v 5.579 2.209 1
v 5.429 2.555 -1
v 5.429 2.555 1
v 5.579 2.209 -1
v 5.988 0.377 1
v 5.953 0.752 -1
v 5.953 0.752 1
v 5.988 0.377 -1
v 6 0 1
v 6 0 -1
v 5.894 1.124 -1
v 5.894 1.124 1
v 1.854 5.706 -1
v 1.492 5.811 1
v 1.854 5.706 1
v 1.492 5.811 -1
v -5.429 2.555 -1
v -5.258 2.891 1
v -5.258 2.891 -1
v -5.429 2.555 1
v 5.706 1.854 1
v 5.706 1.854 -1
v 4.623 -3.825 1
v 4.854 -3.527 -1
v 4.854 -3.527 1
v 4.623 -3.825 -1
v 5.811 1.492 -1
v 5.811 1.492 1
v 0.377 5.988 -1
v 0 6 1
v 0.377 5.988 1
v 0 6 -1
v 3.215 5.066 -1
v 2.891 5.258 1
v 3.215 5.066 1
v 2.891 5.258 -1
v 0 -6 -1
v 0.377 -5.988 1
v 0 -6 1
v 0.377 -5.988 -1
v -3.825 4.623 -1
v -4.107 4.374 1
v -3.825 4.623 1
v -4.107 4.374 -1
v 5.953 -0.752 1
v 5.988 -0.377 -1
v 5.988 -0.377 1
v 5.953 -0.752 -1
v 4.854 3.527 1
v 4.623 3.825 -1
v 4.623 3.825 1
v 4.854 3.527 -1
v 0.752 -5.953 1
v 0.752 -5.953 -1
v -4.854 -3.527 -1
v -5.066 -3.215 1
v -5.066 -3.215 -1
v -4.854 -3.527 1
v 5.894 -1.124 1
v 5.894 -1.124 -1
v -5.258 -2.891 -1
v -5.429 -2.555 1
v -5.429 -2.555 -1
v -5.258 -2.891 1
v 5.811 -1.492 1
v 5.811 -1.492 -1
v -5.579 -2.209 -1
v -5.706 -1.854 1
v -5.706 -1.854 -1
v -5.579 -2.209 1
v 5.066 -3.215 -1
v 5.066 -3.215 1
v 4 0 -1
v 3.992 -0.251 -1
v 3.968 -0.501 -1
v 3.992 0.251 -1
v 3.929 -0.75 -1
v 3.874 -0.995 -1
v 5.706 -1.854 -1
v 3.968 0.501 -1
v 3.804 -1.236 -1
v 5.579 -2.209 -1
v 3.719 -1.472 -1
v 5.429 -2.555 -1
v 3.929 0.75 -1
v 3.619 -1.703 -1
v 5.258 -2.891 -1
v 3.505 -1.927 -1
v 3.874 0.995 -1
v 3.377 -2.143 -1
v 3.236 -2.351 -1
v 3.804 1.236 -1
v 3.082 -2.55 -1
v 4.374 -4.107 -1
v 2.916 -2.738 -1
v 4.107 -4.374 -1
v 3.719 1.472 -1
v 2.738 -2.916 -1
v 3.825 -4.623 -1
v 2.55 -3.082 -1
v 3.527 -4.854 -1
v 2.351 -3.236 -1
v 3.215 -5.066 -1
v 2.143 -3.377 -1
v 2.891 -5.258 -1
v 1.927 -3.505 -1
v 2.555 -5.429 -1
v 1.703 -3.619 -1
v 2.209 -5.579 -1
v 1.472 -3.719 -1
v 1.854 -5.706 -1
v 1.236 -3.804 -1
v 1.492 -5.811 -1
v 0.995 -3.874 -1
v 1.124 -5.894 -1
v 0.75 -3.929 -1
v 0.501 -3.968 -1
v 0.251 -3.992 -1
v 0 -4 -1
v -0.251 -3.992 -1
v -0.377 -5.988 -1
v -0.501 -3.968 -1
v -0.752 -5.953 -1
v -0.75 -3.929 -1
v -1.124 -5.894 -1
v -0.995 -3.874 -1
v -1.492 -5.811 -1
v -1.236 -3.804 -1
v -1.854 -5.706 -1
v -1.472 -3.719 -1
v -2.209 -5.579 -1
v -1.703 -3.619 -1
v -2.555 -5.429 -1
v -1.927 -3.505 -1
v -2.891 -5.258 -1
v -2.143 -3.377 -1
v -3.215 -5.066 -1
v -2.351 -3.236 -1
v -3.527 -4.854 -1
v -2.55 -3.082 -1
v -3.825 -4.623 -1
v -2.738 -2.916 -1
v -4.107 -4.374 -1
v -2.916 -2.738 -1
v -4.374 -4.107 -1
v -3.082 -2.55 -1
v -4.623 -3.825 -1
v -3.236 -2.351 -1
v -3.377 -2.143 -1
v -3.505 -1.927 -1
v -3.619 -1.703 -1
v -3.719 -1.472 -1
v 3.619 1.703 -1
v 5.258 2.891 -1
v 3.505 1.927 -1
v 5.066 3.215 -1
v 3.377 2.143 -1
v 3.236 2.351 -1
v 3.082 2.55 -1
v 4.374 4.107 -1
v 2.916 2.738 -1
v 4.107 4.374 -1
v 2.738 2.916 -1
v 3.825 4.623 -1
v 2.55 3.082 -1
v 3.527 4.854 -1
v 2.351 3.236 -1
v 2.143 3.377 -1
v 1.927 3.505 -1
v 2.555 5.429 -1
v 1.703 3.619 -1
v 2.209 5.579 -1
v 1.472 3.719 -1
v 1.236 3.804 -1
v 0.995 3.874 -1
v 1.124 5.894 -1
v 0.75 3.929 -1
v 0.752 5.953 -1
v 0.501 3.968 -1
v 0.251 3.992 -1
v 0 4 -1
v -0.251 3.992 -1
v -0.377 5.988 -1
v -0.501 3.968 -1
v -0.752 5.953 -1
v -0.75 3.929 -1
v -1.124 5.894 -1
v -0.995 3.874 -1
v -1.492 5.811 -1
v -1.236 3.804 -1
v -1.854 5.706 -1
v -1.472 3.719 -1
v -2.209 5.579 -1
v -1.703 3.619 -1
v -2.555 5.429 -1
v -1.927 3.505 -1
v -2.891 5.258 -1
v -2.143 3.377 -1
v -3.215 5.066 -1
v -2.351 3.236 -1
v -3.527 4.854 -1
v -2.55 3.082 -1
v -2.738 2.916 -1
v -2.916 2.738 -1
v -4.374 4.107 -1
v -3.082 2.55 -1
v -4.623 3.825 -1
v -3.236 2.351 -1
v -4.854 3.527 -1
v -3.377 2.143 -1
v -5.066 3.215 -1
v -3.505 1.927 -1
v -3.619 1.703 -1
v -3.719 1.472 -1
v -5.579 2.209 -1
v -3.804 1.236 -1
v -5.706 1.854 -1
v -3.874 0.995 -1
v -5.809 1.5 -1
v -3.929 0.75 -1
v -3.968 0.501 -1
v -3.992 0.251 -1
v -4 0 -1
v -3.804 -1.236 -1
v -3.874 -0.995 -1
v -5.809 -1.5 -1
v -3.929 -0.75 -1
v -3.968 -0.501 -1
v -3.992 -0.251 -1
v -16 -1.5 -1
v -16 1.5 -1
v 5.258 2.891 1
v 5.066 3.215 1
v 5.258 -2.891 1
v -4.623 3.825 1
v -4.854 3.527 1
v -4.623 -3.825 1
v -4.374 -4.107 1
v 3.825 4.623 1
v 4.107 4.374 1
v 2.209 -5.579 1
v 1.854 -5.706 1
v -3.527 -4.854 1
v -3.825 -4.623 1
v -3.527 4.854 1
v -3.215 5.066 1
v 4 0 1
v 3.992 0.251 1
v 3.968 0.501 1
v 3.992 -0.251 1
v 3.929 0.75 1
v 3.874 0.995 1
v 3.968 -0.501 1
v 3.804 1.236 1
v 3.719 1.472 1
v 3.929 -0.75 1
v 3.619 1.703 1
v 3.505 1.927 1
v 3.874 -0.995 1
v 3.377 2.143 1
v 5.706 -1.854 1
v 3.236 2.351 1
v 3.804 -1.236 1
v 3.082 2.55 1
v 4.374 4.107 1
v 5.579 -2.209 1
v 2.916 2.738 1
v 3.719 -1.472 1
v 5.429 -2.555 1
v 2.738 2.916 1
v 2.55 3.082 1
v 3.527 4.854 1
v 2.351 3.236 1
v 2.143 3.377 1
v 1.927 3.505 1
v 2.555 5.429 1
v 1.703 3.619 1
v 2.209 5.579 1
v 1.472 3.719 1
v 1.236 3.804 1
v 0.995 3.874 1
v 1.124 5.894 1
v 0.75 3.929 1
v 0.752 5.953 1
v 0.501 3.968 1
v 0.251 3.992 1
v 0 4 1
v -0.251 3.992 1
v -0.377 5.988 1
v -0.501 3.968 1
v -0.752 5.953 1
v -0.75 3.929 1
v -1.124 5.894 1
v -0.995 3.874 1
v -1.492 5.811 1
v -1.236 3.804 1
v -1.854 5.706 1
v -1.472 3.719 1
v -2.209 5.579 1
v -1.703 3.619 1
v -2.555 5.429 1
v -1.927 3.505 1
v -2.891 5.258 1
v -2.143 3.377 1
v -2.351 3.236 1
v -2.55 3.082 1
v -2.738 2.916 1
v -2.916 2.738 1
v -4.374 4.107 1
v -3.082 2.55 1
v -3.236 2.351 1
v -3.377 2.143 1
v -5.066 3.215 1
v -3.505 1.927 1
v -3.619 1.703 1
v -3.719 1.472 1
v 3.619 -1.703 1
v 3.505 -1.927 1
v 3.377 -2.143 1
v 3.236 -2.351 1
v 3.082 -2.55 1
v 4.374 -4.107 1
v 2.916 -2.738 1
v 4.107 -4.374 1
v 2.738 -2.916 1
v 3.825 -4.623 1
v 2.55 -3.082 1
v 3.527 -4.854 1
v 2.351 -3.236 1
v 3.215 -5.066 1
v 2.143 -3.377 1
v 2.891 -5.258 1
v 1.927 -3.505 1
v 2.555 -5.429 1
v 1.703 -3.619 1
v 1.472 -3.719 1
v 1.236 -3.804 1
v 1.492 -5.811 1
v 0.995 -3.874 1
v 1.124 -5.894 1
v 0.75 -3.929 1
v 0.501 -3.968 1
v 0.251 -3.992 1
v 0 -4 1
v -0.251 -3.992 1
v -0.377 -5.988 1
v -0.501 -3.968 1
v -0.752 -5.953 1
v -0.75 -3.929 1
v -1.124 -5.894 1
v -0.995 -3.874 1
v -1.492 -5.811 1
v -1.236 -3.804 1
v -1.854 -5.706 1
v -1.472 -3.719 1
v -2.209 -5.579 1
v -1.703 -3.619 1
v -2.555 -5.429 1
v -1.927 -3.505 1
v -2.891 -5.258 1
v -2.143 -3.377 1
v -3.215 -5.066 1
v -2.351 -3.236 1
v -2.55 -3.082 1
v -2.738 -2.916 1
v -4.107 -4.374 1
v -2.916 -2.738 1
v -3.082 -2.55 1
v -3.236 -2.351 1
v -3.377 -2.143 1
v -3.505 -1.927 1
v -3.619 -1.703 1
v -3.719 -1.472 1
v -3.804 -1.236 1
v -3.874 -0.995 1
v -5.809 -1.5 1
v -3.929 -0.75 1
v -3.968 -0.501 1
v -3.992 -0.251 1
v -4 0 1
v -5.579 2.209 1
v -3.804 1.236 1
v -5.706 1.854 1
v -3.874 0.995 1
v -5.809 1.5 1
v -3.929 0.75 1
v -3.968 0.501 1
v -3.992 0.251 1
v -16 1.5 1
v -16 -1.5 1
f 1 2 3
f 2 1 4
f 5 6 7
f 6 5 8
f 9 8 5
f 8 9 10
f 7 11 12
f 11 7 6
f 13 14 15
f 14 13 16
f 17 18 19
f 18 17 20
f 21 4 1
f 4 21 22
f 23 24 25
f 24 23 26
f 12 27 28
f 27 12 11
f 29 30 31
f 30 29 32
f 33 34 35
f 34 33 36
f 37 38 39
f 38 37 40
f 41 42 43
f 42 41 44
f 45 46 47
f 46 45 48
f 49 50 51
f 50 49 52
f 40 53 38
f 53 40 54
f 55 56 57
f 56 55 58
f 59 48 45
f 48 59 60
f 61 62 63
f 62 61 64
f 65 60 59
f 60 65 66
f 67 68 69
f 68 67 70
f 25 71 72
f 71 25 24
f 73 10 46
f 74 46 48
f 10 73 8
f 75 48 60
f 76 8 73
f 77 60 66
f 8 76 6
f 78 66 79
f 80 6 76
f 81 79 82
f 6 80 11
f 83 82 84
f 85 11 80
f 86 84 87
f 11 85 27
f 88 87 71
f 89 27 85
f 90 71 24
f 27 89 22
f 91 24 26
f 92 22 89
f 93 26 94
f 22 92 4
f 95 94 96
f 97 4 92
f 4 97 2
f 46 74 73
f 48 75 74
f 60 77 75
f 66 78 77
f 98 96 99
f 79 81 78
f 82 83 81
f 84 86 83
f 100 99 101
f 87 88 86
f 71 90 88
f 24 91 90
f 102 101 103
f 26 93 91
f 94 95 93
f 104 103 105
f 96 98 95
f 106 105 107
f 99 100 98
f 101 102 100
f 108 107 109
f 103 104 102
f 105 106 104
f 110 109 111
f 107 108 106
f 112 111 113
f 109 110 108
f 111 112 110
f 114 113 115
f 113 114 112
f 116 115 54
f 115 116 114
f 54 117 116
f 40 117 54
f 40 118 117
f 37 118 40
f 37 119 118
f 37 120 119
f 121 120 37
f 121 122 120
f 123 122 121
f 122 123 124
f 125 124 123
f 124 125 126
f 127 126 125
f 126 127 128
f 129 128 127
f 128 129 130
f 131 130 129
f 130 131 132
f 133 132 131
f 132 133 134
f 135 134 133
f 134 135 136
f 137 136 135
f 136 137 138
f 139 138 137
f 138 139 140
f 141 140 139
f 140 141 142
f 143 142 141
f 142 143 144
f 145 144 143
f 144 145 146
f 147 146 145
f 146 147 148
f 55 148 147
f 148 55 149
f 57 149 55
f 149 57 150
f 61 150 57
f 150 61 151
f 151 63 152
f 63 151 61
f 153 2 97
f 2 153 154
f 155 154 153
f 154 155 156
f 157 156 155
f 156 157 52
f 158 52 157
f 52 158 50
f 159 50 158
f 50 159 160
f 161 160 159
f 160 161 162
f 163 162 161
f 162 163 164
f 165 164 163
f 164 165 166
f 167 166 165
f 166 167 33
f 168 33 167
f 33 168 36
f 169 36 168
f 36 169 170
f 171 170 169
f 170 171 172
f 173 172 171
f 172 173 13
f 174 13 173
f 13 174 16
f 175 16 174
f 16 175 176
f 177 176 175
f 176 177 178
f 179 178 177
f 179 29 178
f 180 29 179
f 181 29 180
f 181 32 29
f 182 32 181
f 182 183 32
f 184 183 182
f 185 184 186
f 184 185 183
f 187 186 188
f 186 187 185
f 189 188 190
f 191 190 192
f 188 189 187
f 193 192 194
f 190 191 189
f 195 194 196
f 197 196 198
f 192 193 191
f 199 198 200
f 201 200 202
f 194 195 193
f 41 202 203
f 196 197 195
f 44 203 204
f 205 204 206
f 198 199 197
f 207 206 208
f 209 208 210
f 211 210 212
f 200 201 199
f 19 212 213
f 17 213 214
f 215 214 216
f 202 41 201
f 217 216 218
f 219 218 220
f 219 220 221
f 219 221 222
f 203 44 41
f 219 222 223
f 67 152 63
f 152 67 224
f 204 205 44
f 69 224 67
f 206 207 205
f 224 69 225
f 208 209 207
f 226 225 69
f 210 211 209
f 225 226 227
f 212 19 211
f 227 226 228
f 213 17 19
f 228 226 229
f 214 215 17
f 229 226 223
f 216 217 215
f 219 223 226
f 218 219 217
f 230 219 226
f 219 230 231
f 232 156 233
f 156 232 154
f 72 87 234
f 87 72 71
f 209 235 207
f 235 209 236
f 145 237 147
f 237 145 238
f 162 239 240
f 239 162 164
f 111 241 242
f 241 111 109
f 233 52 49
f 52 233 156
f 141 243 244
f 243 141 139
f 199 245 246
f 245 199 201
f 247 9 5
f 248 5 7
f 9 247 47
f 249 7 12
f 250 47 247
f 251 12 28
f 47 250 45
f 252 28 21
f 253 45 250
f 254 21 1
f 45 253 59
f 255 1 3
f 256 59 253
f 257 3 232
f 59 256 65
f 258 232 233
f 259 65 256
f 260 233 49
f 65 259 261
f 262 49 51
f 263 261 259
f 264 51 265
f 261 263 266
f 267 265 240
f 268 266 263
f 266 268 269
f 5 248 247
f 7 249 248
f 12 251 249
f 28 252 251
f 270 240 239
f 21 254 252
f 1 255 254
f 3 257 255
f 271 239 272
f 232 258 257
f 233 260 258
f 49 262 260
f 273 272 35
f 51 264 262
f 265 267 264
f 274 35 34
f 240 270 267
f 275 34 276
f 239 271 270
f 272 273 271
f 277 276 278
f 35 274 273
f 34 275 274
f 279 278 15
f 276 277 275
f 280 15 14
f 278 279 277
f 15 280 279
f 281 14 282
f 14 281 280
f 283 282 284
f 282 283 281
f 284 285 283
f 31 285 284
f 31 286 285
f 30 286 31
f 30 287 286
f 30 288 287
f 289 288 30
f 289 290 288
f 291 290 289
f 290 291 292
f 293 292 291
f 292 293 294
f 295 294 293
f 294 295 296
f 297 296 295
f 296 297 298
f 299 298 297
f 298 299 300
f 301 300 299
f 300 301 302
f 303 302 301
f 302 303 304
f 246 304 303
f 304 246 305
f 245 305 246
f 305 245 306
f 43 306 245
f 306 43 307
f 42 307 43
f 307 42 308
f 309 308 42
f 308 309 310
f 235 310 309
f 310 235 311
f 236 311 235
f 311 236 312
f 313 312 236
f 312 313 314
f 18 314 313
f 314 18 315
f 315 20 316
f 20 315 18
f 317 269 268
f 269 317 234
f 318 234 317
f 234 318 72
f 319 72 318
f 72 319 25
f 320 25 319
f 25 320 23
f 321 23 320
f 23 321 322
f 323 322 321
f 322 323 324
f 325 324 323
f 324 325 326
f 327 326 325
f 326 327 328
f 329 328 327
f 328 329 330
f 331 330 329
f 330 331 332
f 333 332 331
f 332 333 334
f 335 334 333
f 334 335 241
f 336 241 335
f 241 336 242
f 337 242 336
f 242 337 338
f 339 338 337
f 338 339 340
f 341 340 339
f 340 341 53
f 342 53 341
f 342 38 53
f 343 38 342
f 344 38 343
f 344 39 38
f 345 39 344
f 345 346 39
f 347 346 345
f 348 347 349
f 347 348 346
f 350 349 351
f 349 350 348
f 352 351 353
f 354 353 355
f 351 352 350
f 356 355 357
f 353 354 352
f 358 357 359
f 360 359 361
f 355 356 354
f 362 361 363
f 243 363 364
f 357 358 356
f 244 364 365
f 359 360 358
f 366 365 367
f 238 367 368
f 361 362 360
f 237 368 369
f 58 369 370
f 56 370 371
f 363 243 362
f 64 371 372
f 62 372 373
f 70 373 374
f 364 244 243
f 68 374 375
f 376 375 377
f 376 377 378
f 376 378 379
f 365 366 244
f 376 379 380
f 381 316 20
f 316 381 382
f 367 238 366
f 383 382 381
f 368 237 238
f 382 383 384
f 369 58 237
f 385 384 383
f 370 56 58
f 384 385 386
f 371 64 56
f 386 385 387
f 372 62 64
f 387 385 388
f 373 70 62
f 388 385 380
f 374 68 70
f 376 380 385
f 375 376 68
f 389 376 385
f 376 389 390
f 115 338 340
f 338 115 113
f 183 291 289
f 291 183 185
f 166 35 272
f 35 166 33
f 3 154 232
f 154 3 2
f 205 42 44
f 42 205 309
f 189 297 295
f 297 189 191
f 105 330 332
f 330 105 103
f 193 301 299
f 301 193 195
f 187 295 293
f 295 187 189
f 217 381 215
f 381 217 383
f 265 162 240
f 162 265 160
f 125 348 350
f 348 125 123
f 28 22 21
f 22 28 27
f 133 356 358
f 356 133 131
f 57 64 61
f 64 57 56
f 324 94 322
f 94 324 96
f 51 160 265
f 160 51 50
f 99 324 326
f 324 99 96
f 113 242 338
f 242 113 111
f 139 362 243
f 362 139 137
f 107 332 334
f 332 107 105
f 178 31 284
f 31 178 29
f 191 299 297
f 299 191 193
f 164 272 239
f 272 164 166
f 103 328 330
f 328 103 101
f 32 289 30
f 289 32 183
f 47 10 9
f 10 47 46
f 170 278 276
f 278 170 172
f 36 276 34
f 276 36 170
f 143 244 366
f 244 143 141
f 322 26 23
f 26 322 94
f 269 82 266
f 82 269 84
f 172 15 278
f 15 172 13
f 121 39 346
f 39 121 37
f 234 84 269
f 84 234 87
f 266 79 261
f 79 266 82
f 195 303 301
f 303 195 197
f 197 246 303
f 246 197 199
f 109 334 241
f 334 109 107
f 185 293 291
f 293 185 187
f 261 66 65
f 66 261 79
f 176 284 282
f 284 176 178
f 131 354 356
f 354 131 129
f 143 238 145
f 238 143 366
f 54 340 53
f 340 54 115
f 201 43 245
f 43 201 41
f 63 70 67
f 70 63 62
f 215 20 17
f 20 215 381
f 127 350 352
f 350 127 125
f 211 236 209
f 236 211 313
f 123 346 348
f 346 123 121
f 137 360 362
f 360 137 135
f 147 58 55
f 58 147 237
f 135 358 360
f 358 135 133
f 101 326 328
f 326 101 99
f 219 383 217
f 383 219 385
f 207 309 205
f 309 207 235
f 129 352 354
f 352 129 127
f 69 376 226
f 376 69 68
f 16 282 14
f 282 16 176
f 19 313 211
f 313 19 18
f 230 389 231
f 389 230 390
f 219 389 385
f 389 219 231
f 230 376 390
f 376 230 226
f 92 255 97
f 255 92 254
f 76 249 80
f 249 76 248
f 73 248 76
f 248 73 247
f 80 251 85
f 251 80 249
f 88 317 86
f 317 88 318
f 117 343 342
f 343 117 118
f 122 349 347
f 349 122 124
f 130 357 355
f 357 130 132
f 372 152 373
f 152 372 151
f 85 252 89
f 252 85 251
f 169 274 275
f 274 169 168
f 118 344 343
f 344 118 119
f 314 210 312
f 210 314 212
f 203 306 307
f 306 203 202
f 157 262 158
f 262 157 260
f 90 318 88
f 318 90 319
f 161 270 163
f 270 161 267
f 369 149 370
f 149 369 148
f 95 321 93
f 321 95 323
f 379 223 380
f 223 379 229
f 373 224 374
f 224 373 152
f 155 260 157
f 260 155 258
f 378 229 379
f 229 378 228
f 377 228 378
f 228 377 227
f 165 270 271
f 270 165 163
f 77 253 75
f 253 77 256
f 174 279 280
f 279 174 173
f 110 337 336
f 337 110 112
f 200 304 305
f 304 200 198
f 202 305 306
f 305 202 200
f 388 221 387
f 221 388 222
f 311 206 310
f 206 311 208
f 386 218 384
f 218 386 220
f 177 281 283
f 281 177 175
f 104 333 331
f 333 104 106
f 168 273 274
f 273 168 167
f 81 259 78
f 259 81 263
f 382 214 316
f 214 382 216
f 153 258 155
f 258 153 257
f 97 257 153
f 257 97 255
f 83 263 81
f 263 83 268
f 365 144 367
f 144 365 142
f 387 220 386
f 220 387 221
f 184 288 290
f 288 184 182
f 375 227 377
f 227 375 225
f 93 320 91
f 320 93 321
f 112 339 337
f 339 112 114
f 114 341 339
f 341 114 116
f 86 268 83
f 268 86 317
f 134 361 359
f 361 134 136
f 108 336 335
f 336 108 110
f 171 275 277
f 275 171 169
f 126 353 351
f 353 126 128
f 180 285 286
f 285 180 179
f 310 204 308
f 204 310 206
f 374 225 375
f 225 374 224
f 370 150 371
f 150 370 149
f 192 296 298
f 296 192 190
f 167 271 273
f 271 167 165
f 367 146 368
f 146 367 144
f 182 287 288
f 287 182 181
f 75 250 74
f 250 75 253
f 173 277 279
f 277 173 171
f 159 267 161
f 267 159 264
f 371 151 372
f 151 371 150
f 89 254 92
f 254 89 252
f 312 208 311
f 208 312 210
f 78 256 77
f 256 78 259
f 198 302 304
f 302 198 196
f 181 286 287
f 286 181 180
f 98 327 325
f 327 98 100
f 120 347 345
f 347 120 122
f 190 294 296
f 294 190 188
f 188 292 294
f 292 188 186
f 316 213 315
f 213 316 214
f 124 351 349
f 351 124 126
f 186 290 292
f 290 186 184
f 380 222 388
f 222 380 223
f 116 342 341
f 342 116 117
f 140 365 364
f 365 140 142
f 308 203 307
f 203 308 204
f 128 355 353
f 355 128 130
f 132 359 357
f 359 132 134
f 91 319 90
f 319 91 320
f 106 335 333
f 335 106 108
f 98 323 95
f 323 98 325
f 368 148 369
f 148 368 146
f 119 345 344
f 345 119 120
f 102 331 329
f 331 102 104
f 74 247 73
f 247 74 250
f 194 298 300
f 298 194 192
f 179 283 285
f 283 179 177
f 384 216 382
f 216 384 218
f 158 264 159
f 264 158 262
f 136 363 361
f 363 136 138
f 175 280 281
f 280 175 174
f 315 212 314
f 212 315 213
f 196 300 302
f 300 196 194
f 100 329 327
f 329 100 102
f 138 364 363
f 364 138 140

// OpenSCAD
$fn = 100;

module end_piece(){
width = 20;
radius = 6;
height = 2;



difference(){
union(){

cylinder(r = radius, h = height, center = true);
translate([-radius,0,0])	cube([20,radius/2,height], center = true);
}

cylinder(r = 4, h = height+1, center = true);

}


}



end_piece();
